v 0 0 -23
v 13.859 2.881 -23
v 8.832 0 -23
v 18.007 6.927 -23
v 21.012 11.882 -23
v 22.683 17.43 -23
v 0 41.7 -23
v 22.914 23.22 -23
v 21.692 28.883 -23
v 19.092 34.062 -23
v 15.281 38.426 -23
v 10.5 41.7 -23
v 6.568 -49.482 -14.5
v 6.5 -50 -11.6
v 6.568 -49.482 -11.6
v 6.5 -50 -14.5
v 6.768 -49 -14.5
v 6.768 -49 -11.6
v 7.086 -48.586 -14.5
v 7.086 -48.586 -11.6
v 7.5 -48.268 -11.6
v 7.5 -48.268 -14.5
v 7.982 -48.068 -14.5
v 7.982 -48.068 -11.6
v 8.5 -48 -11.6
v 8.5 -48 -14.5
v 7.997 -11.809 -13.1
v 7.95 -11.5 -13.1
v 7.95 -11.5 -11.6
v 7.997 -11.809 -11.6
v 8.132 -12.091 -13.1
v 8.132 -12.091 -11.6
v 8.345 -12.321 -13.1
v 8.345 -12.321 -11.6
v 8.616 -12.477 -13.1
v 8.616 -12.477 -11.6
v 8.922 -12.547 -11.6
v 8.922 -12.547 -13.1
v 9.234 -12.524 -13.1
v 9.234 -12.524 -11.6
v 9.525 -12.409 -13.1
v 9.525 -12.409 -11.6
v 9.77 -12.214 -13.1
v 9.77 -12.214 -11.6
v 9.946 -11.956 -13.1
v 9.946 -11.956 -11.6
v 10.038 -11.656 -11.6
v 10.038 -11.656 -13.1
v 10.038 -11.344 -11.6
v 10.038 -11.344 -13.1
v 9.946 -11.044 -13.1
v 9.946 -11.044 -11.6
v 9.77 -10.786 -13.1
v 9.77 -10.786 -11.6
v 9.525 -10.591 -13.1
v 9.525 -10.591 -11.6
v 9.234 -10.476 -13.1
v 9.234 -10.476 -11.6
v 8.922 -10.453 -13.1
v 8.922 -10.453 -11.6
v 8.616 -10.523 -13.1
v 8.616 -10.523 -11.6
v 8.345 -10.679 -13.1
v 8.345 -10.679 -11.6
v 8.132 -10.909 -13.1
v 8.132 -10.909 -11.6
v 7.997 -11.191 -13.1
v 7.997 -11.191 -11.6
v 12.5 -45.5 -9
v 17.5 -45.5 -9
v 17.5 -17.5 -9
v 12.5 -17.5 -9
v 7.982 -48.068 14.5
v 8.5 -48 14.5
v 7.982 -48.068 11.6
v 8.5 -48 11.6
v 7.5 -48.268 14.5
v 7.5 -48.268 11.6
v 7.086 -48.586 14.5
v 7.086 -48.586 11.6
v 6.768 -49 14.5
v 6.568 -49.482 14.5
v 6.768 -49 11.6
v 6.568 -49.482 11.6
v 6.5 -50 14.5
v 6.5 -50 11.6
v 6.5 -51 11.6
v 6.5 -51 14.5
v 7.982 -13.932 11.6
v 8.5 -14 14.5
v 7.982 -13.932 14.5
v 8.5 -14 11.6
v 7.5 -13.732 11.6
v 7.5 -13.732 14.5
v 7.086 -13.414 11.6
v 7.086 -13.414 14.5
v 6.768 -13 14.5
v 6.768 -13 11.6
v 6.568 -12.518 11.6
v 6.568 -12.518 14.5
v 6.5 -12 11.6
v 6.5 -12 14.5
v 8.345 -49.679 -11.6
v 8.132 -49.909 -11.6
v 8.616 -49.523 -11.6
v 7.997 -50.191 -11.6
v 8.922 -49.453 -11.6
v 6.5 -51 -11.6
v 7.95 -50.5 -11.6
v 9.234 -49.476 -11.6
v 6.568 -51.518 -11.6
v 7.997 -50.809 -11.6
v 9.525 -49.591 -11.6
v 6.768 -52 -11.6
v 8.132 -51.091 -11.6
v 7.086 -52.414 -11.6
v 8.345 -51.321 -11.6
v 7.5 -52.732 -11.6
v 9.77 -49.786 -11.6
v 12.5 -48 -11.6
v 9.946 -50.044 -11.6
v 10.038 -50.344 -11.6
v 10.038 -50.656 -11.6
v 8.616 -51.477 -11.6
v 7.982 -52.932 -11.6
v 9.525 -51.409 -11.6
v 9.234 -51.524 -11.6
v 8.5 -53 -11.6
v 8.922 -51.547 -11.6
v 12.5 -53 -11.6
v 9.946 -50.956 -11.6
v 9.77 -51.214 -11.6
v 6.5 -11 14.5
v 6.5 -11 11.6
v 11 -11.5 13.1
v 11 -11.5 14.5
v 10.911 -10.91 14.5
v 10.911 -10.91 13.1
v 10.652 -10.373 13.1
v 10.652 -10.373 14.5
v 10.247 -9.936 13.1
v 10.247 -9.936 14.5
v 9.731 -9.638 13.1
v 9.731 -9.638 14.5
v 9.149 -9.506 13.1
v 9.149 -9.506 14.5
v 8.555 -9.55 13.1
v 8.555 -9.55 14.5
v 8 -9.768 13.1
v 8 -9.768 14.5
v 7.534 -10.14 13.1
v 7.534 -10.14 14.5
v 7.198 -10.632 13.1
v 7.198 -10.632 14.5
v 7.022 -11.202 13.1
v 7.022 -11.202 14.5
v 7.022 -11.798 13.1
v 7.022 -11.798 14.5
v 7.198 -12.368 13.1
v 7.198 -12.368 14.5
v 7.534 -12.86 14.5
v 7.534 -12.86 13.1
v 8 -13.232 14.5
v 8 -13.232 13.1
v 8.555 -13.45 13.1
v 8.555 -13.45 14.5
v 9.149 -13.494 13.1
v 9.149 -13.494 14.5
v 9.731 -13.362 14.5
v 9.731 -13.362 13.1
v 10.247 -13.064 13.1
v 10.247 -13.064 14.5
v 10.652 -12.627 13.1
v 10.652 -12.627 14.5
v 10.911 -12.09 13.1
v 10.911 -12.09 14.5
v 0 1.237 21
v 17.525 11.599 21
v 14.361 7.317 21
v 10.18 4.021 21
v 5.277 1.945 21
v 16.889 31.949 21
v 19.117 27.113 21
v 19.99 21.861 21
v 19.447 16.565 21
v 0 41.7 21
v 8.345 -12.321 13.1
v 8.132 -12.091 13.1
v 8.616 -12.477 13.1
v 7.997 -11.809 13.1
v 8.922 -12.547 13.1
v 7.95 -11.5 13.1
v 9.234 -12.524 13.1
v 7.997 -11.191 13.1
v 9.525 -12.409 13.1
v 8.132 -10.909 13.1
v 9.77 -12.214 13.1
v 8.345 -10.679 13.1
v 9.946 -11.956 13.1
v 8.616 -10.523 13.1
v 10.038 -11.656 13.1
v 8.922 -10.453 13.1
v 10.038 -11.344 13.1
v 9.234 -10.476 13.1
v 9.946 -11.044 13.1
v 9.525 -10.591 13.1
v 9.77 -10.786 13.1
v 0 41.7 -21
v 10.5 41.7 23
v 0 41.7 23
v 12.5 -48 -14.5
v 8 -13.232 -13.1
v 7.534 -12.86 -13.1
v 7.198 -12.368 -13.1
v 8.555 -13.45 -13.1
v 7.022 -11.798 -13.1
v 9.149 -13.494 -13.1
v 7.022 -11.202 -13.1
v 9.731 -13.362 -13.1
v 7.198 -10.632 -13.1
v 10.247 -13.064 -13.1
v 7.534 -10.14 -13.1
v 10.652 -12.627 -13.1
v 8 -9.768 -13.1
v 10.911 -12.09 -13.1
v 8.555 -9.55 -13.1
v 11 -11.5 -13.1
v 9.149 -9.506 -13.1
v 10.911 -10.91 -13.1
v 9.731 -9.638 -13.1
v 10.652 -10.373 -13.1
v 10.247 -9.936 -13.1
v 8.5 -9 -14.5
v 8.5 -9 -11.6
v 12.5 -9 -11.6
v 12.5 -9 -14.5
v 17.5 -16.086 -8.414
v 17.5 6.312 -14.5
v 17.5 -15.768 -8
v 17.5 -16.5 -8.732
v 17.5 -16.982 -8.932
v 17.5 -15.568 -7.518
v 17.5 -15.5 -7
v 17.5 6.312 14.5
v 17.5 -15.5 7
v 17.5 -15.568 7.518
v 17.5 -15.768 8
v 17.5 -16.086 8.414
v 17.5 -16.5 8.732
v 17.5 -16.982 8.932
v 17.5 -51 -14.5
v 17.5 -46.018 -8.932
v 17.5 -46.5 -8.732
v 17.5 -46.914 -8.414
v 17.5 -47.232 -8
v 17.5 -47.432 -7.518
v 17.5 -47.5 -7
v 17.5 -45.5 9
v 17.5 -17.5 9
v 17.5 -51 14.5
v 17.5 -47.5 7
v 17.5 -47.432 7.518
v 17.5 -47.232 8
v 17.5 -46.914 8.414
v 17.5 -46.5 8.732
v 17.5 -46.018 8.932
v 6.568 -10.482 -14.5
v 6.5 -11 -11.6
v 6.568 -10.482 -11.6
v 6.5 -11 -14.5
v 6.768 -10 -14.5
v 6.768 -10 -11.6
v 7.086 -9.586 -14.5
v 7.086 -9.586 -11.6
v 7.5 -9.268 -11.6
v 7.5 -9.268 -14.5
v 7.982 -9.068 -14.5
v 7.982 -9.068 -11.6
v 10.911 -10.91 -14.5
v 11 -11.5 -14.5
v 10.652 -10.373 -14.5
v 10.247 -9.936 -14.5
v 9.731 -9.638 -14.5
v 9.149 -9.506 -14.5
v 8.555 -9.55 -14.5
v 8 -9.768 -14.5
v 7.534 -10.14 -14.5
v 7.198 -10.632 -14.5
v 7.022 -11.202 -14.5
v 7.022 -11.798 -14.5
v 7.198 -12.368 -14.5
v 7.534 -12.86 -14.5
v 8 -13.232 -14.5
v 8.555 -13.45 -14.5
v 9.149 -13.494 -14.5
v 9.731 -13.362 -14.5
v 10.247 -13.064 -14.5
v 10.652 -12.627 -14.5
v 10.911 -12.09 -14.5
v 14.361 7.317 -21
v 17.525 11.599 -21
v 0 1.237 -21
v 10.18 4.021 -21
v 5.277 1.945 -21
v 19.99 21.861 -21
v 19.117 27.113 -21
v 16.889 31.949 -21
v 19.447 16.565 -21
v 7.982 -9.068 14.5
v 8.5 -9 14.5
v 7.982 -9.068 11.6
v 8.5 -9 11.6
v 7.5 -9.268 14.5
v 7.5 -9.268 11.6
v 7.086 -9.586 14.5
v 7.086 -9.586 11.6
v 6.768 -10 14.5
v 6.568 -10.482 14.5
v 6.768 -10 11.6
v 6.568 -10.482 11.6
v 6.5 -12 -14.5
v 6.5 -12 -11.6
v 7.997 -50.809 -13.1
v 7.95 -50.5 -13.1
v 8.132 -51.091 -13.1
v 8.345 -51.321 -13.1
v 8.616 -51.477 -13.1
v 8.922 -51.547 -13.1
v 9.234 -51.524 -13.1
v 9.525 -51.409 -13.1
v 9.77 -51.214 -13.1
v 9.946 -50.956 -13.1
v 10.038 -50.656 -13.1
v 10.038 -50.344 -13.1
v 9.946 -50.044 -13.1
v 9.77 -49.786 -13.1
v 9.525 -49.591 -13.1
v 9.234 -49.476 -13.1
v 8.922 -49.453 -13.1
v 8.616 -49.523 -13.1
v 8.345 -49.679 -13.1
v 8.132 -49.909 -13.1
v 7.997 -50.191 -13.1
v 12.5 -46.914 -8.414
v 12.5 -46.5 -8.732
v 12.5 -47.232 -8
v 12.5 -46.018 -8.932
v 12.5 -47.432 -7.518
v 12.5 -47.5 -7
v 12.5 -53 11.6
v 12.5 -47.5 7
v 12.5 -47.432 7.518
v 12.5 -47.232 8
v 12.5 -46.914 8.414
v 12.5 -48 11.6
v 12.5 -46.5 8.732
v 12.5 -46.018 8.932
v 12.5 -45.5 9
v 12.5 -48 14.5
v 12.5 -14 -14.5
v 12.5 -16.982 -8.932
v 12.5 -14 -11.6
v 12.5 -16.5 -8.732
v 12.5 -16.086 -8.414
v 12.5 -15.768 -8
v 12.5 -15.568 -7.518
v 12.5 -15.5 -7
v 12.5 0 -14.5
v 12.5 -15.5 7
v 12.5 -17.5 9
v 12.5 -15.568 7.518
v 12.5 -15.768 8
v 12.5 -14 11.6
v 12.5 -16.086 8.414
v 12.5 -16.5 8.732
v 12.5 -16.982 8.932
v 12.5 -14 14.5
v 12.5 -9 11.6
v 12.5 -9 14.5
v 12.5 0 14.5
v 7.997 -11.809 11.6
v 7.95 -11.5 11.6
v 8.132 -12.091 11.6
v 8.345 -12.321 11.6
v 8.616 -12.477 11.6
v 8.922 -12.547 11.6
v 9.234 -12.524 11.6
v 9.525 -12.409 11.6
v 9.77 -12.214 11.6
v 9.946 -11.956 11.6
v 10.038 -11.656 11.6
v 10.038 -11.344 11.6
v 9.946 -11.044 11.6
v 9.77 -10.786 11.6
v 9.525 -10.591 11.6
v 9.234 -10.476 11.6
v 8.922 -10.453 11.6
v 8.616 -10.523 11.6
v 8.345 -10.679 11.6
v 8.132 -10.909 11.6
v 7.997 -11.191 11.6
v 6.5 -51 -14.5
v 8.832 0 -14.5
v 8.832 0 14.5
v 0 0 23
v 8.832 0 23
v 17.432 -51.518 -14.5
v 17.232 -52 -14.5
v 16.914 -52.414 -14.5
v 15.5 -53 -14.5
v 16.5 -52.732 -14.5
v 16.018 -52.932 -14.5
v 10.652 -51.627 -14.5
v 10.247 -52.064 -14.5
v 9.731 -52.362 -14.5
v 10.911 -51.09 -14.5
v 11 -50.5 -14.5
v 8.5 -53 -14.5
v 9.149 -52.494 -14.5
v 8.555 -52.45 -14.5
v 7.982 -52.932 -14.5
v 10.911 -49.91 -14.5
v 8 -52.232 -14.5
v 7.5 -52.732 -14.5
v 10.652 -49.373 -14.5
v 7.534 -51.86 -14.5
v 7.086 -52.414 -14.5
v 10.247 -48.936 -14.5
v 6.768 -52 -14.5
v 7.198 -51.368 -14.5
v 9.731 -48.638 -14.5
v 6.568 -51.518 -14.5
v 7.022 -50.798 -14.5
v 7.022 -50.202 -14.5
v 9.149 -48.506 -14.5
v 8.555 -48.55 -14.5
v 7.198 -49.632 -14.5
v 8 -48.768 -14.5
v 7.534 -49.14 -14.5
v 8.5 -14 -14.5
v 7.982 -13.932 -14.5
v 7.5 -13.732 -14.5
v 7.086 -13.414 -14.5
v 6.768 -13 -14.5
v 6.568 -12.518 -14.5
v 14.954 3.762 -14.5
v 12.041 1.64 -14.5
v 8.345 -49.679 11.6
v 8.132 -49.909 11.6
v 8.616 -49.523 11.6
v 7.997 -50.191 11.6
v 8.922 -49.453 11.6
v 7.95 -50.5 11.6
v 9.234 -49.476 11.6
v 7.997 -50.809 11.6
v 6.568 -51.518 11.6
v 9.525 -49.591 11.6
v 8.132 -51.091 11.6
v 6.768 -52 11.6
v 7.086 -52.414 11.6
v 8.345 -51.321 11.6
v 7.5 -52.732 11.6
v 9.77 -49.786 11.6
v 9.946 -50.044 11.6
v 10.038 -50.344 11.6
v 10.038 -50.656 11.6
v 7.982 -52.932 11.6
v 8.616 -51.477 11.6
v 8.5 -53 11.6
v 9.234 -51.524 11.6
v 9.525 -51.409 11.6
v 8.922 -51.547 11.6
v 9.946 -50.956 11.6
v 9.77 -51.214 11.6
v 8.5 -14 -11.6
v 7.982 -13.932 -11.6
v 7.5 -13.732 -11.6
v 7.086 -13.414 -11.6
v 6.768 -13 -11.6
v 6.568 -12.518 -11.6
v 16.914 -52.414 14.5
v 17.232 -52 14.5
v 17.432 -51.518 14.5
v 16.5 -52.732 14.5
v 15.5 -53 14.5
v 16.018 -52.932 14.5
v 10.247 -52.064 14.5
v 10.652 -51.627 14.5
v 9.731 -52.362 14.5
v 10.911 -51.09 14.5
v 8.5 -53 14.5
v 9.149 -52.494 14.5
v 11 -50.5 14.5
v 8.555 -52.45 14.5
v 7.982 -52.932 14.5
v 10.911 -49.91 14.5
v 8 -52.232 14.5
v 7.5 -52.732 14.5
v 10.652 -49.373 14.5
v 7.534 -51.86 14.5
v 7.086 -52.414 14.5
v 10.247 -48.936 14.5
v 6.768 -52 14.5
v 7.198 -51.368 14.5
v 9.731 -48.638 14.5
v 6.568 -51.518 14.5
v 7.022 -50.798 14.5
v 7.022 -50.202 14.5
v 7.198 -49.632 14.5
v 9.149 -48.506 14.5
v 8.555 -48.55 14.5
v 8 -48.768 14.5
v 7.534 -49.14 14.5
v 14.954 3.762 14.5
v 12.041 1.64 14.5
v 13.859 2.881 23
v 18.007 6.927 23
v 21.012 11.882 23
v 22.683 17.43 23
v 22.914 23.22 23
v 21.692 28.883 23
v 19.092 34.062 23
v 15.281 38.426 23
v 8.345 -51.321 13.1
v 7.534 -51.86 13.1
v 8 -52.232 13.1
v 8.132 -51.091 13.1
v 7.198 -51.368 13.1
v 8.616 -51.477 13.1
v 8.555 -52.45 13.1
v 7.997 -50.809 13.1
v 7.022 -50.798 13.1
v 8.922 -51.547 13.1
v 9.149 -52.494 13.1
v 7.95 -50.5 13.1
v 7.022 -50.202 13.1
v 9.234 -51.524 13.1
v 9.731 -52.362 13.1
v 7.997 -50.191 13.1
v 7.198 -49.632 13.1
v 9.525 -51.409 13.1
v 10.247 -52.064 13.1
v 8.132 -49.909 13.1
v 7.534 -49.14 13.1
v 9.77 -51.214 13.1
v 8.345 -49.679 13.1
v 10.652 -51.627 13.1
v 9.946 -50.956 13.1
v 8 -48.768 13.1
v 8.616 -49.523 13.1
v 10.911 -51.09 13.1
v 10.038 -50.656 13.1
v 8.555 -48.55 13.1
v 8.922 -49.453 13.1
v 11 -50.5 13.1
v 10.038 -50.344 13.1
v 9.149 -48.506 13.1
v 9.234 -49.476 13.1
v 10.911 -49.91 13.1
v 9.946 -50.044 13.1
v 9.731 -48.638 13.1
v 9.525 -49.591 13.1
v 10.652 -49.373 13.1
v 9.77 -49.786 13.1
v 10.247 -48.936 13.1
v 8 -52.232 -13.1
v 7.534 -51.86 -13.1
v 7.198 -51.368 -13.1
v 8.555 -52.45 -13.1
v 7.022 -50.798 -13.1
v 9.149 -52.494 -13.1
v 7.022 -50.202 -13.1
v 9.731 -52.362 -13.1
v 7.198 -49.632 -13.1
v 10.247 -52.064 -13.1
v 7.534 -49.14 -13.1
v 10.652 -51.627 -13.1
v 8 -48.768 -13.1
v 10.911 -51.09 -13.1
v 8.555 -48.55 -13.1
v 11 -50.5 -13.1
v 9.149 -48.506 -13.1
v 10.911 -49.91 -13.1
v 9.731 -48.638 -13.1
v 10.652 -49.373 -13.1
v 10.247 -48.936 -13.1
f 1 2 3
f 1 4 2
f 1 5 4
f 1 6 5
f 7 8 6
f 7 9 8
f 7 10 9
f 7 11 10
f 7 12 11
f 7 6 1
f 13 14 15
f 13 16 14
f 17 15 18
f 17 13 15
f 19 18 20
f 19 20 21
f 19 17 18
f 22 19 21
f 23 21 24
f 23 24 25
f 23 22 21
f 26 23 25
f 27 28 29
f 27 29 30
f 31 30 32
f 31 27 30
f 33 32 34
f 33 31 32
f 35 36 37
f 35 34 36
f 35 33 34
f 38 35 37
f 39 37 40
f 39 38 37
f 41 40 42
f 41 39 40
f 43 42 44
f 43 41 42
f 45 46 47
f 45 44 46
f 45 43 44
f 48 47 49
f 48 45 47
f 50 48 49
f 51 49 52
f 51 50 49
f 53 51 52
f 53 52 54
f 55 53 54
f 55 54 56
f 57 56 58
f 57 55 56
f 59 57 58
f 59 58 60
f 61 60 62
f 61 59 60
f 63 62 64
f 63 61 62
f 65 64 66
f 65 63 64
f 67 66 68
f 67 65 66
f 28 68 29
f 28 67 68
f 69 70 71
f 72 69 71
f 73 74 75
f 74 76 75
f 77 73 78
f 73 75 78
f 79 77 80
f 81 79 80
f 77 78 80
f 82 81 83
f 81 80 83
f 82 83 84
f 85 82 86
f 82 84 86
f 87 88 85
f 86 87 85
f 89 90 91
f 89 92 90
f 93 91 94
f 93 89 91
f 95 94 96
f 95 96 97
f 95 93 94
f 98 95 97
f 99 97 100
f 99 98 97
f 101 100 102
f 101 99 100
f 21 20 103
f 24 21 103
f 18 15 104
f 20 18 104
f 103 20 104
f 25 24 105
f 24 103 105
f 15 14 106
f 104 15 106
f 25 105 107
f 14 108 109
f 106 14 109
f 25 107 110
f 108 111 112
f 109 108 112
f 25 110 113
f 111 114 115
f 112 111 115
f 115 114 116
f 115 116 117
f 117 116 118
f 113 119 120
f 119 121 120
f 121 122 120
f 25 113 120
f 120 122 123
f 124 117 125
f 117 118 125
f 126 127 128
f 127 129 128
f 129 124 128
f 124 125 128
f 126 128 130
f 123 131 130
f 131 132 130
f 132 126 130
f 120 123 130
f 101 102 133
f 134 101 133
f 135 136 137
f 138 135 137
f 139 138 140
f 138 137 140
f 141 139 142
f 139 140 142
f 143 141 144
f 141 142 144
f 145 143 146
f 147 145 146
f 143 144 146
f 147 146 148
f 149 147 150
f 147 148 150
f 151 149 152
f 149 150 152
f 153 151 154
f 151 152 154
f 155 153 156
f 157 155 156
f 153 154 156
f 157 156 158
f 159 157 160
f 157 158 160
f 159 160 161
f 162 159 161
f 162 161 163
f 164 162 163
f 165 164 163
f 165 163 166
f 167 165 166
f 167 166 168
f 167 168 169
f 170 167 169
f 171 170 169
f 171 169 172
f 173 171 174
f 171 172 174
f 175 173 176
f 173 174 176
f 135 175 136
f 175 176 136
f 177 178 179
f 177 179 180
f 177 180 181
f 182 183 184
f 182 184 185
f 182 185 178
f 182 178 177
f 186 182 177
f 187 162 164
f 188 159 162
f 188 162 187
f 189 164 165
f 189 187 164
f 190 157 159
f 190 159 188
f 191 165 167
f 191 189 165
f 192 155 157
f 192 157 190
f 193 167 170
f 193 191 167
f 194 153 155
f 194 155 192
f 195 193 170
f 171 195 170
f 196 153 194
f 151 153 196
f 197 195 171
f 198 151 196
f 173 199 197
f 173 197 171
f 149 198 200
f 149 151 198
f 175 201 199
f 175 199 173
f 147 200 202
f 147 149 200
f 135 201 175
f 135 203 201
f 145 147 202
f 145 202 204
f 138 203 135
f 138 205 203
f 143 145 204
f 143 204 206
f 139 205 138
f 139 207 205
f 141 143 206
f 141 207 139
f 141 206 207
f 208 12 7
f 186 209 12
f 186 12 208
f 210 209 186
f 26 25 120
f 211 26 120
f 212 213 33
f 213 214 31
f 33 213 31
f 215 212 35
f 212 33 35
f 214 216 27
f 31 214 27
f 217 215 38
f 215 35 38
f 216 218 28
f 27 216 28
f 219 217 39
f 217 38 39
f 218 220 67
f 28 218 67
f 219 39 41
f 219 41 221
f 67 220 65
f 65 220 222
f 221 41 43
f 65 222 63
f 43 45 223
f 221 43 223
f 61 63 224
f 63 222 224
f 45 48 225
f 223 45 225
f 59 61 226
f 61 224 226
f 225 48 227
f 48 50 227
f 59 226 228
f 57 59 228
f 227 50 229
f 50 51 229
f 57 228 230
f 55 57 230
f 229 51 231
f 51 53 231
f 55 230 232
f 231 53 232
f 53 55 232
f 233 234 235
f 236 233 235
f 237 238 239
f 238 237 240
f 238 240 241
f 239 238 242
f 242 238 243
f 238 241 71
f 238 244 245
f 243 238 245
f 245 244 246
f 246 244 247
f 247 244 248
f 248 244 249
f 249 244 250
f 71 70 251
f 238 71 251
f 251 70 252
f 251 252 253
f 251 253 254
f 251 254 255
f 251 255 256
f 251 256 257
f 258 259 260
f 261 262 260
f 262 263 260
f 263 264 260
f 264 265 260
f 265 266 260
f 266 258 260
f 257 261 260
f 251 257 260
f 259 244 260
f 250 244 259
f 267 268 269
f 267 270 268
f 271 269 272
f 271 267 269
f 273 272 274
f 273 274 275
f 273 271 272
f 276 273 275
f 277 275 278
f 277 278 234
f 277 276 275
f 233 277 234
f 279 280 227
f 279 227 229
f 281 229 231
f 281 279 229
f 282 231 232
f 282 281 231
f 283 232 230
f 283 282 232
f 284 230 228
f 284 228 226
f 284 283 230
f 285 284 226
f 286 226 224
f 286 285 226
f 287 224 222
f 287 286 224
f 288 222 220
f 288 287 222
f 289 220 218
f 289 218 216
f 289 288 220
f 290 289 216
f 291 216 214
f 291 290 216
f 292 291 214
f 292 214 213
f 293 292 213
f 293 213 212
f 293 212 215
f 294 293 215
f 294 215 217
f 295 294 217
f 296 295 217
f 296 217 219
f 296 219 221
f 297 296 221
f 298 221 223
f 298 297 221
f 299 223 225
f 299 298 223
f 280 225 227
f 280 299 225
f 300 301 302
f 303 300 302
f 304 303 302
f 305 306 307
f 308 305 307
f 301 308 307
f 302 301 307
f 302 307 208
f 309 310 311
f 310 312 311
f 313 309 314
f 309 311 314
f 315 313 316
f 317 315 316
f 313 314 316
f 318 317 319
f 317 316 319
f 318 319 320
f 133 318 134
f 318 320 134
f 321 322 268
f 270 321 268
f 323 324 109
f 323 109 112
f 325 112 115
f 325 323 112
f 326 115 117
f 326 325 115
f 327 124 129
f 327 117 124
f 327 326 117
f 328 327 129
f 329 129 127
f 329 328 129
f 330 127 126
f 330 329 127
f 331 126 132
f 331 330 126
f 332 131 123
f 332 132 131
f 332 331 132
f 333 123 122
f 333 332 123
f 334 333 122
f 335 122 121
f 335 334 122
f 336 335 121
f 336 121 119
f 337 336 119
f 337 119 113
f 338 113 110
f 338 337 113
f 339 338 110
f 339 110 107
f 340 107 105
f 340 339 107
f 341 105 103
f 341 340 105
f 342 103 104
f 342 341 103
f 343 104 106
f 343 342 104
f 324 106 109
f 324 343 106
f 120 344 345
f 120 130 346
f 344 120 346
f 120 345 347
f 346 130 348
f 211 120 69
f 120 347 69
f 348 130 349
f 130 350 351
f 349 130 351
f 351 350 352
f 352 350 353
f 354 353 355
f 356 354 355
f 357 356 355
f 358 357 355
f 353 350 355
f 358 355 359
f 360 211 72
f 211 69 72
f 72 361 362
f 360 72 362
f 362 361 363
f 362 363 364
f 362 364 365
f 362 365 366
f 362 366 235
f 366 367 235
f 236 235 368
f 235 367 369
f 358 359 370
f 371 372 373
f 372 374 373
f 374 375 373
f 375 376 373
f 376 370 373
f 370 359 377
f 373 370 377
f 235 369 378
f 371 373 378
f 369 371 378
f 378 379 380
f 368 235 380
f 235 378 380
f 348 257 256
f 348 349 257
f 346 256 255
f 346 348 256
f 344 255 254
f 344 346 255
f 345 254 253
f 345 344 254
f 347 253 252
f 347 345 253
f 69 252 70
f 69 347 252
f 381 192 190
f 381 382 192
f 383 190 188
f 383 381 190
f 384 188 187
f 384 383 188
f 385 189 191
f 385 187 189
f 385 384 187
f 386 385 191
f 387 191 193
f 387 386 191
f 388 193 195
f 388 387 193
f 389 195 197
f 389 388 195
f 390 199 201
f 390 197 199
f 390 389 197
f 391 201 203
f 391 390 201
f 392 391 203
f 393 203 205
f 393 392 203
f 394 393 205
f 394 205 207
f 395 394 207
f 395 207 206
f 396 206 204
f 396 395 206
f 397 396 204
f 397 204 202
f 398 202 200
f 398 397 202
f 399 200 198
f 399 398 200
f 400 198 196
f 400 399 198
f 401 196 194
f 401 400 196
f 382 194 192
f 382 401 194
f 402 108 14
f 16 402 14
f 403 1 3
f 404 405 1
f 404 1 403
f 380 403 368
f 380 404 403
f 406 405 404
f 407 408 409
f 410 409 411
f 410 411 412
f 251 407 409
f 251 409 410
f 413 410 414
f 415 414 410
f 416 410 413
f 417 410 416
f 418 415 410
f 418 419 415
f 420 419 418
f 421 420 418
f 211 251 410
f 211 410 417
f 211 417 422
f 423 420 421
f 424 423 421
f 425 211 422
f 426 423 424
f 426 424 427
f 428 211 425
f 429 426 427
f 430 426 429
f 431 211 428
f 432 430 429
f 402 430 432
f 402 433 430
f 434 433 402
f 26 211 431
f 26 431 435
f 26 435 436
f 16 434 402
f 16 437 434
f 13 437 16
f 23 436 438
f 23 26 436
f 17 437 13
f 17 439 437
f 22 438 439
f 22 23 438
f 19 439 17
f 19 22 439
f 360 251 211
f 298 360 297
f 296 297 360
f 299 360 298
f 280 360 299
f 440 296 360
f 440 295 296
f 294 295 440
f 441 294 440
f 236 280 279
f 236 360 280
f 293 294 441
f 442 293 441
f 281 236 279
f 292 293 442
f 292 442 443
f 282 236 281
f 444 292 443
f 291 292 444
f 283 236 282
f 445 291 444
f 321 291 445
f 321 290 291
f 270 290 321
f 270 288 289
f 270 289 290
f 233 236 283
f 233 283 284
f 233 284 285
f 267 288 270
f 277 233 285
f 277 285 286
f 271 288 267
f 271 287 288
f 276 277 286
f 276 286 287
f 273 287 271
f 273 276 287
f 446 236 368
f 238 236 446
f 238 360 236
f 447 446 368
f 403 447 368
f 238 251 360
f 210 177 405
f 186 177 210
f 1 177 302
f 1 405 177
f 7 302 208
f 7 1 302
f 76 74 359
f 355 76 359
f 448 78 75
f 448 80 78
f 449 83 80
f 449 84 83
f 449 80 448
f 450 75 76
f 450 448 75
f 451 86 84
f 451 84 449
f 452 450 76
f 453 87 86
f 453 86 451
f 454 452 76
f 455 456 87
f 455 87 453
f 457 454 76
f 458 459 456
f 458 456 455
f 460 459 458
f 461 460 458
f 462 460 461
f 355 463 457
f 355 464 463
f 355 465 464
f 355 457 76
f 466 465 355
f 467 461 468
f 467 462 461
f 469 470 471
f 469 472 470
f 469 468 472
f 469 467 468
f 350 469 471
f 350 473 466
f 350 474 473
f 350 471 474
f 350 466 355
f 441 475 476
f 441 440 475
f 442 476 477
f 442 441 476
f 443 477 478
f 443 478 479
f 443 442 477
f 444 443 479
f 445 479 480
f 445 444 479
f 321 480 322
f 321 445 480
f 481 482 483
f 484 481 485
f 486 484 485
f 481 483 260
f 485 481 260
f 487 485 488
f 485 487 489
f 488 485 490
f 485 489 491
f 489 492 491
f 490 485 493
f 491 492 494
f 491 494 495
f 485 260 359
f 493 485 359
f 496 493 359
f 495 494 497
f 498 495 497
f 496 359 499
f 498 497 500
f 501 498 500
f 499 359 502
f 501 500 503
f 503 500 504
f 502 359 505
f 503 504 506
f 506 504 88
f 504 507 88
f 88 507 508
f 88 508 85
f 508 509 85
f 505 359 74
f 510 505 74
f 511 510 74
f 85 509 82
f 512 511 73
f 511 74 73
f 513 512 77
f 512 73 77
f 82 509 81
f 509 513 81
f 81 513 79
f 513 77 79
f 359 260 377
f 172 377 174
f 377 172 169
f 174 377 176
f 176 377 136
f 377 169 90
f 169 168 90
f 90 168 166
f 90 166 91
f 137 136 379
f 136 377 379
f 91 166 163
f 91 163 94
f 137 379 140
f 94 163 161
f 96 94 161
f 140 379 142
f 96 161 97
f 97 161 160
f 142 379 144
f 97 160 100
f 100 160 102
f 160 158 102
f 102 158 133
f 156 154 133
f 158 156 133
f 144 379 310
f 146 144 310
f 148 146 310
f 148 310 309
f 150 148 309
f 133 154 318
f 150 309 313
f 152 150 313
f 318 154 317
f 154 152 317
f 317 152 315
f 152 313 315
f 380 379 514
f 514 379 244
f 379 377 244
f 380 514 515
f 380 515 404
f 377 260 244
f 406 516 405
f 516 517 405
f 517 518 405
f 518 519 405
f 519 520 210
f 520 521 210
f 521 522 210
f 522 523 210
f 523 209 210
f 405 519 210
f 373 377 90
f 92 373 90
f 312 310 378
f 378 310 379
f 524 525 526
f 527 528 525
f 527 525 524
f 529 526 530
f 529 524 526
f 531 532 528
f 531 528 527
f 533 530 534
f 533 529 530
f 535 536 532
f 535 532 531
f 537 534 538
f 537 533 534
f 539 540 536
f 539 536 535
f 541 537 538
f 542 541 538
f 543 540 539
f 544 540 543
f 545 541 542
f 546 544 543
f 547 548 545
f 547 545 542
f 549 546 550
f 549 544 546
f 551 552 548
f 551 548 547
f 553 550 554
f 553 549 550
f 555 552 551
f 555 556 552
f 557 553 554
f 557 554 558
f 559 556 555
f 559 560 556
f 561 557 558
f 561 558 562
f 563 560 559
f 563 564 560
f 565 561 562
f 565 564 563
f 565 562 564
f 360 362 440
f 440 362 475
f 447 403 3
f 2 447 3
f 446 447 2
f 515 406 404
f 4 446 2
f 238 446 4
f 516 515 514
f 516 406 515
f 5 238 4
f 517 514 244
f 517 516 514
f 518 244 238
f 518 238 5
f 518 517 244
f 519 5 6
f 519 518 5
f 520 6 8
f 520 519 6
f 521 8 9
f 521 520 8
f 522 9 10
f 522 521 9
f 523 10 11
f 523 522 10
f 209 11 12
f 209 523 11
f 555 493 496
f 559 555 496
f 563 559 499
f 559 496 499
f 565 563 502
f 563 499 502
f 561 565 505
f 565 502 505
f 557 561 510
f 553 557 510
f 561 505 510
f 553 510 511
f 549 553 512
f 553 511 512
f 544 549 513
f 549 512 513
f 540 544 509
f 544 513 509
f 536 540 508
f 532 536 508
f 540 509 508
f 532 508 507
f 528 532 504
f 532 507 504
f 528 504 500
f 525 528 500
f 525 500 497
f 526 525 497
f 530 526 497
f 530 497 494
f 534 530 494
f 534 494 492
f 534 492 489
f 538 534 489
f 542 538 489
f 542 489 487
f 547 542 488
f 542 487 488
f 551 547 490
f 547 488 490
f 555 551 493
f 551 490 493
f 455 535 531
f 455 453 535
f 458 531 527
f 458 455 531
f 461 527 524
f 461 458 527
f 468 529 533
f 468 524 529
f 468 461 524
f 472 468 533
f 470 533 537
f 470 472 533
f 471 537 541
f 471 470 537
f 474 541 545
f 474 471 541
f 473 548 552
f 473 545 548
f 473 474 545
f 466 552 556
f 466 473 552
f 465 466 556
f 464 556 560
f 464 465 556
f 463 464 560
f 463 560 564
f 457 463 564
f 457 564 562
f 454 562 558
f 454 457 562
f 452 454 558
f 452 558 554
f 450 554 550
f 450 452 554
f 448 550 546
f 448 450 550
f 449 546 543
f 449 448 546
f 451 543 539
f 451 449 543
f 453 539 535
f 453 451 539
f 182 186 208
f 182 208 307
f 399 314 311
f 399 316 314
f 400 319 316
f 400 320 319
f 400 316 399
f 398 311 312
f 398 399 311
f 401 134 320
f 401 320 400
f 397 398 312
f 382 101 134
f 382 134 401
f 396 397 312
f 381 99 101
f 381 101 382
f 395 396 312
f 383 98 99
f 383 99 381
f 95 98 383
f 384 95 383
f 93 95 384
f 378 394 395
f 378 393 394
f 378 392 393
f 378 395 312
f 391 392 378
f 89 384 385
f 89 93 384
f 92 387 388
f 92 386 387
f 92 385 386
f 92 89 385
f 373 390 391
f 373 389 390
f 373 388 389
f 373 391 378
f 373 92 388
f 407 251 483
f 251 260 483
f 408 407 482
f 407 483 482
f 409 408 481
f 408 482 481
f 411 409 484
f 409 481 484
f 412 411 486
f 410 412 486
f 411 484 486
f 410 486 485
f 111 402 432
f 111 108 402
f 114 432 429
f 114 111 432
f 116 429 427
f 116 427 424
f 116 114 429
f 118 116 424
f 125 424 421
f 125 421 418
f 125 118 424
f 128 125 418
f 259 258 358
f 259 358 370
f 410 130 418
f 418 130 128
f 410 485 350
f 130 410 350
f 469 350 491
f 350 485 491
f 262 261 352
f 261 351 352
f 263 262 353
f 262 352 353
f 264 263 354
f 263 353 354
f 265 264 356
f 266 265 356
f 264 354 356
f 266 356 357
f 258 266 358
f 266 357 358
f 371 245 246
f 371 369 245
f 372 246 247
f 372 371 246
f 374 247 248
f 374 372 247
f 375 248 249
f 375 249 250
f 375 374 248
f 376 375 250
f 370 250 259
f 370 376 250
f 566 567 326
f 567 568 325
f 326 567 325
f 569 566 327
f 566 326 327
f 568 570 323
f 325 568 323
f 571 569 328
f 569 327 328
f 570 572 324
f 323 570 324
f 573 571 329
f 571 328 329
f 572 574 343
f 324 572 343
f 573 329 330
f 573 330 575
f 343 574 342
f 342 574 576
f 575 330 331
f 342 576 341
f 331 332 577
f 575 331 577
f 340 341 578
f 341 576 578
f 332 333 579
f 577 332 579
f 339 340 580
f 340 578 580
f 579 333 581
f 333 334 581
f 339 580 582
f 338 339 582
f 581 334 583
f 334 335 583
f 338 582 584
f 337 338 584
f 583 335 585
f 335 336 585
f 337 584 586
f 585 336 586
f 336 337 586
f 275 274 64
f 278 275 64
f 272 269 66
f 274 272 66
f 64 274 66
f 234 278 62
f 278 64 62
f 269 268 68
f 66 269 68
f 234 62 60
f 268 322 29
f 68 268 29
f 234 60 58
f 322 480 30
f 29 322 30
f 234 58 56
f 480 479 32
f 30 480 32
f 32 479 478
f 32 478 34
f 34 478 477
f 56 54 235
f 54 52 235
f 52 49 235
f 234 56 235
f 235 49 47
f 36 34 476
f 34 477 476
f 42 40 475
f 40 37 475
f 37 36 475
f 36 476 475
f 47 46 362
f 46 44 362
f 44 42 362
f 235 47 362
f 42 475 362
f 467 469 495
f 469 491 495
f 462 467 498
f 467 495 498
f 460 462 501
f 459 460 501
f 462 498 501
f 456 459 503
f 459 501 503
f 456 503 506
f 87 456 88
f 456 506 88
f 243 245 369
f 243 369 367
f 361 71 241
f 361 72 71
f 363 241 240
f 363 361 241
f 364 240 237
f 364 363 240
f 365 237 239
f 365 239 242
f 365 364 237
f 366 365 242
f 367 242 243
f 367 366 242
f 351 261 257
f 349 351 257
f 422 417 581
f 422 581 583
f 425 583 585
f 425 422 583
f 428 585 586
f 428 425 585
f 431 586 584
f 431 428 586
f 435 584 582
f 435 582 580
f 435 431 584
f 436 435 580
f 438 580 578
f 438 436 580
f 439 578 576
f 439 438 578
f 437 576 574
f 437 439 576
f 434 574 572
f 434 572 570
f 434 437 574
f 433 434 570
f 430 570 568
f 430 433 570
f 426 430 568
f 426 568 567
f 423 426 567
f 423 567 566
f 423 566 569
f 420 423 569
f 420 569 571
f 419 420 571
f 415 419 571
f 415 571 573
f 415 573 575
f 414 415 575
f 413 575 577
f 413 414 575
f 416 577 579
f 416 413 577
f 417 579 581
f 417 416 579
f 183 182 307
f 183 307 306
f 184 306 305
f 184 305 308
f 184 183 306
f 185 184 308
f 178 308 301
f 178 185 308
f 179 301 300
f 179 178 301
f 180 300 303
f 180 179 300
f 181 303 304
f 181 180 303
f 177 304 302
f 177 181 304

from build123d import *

# Parameters (mm, degrees)
BOSS_EXTRUDE1_DEPTH = 23
BOSS_EXTRUDE2_DEPTH = 2
SKETCH3_R           = 1.05
BOSS_EXTRUDE3_DEPTH = 14.5
SKETCH4_W           = 17
SKETCH4_H           = 23.2
CUT_EXTRUDE1_DEPTH  = 50
SKETCH7_W           = 18
SKETCH7_H           = 32
CUT_EXTRUDE4_DEPTH  = 61.367623773
SKETCH8_R           = 2
CUT_EXTRUDE5_DEPTH  = 1.4
FILLET1_R           = 2


with BuildPart() as part:
    # Sketch1 → Boss-Extrude1 (new, symmetric)
    with BuildSketch(Plane.XY):
        with BuildLine():
            Line((0, 41.7), (16.889174661, 31.949030463))
            ThreePointArc((16.889174661, 31.949030463), (17.524957173, 11.599404984), (0, 1.23661807))
            Line((0, 1.23661807), (0, 0))
            Line((0, 0), (8.83210354, 0))
            ThreePointArc((8.83210354, 0), (22.981624329, 20.31741016), (10.5, 41.7))
            Line((10.5, 41.7), (0, 41.7))
        make_face()
    extrude(amount=BOSS_EXTRUDE1_DEPTH, both=True)

    # Sketch2 → Boss-Extrude2 (add)
    with BuildSketch(Plane.XY.offset(23)):
        with BuildLine():
            Line((0, 41.7), (16.889174661, 31.949030463))
            ThreePointArc((16.889174661, 31.949030463), (17.524957173, 11.599404984), (0, 1.23661807))
            Line((0, 1.23661807), (0, 41.7))
        make_face()
    boss_extrude2 = extrude(amount=-BOSS_EXTRUDE2_DEPTH)

    # Mirror2: Boss-Extrude2 across plane
    add(boss_extrude2.mirror(Plane.XY))

    # Sketch3 → Boss-Extrude3 (add, symmetric)
    with BuildSketch(Plane.XY):
        with BuildLine():
            Line((12.5, -53), (6.5, -53))
            Line((6.5, -53), (6.5, -48))
            Line((6.5, -48), (12.5, -48))
            Line((12.5, -48), (12.5, -14))
            Line((12.5, -14), (6.5, -14))
            Line((6.5, -14), (6.5, -9))
            Line((6.5, -9), (12.5, -9))
            Line((12.5, -9), (12.5, 0))
            Line((12.5, 0), (8.83210354, 0))
            ThreePointArc((8.83210354, 0), (13.539004564, 2.643733533), (17.5, 6.311806514))
            Line((17.5, 6.311806514), (17.5, -53))
            Line((17.5, -53), (12.5, -53))
        make_face()
        with Locations((9, -11.5)):
            Circle(SKETCH3_R, mode=Mode.SUBTRACT)
        with Locations((9, -50.5)):
            Circle(SKETCH3_R, mode=Mode.SUBTRACT)
    extrude(amount=BOSS_EXTRUDE3_DEPTH, both=True)

    # Sketch4 → Cut-Extrude1 (cut)
    with BuildSketch(Plane.XZ.offset(53)):
        with Locations((4, 0)):
            Rectangle(SKETCH4_W, SKETCH4_H)
    extrude(amount=-CUT_EXTRUDE1_DEPTH, mode=Mode.SUBTRACT)

    # Sketch7 → Cut-Extrude4 (cut, through all)
    with BuildSketch(Plane(origin=(17.5, 0, 0), x_dir=(0, 0, -1), z_dir=(1, 0, 0))):
        with Locations((0, -31.5)):
            Rectangle(SKETCH7_W, SKETCH7_H)
    extrude(amount=-CUT_EXTRUDE4_DEPTH, mode=Mode.SUBTRACT)

    # Sketch8 → Cut-Extrude5 (cut)
    with BuildSketch(Plane.XY.offset(14.5)):
        with Locations((9, -11.5)):
            Circle(SKETCH8_R)
        with Locations((9, -50.5)):
            Circle(SKETCH8_R)
    cut_extrude5 = extrude(amount=-CUT_EXTRUDE5_DEPTH, mode=Mode.SUBTRACT)

    # Fillet1
    fillet1_edges = [part.edges().sort_by_distance(p)[0] for p in [
        (15, -47.5, -9),
        (15, -47.5, 9),
        (15, -15.5, 9),
        (15, -15.5, -9),
        (6.5, -48, -13.05),
        (6.5, -53, -13.05),
        (6.5, -48, 13.05),
        (6.5, -53, 13.05),
        (6.5, -14, 13.05),
        (6.5, -14, -13.05),
        (17.5, -53, 0),
        (6.5, -9, 13.05),
        (6.5, -9, -13.05),
    ]]
    fillet(fillet1_edges, radius=FILLET1_R)

    # Mirror3: Cut-Extrude5 across plane
    add(cut_extrude5.mirror(Plane.XY), mode=Mode.SUBTRACT)


solid = part.part
